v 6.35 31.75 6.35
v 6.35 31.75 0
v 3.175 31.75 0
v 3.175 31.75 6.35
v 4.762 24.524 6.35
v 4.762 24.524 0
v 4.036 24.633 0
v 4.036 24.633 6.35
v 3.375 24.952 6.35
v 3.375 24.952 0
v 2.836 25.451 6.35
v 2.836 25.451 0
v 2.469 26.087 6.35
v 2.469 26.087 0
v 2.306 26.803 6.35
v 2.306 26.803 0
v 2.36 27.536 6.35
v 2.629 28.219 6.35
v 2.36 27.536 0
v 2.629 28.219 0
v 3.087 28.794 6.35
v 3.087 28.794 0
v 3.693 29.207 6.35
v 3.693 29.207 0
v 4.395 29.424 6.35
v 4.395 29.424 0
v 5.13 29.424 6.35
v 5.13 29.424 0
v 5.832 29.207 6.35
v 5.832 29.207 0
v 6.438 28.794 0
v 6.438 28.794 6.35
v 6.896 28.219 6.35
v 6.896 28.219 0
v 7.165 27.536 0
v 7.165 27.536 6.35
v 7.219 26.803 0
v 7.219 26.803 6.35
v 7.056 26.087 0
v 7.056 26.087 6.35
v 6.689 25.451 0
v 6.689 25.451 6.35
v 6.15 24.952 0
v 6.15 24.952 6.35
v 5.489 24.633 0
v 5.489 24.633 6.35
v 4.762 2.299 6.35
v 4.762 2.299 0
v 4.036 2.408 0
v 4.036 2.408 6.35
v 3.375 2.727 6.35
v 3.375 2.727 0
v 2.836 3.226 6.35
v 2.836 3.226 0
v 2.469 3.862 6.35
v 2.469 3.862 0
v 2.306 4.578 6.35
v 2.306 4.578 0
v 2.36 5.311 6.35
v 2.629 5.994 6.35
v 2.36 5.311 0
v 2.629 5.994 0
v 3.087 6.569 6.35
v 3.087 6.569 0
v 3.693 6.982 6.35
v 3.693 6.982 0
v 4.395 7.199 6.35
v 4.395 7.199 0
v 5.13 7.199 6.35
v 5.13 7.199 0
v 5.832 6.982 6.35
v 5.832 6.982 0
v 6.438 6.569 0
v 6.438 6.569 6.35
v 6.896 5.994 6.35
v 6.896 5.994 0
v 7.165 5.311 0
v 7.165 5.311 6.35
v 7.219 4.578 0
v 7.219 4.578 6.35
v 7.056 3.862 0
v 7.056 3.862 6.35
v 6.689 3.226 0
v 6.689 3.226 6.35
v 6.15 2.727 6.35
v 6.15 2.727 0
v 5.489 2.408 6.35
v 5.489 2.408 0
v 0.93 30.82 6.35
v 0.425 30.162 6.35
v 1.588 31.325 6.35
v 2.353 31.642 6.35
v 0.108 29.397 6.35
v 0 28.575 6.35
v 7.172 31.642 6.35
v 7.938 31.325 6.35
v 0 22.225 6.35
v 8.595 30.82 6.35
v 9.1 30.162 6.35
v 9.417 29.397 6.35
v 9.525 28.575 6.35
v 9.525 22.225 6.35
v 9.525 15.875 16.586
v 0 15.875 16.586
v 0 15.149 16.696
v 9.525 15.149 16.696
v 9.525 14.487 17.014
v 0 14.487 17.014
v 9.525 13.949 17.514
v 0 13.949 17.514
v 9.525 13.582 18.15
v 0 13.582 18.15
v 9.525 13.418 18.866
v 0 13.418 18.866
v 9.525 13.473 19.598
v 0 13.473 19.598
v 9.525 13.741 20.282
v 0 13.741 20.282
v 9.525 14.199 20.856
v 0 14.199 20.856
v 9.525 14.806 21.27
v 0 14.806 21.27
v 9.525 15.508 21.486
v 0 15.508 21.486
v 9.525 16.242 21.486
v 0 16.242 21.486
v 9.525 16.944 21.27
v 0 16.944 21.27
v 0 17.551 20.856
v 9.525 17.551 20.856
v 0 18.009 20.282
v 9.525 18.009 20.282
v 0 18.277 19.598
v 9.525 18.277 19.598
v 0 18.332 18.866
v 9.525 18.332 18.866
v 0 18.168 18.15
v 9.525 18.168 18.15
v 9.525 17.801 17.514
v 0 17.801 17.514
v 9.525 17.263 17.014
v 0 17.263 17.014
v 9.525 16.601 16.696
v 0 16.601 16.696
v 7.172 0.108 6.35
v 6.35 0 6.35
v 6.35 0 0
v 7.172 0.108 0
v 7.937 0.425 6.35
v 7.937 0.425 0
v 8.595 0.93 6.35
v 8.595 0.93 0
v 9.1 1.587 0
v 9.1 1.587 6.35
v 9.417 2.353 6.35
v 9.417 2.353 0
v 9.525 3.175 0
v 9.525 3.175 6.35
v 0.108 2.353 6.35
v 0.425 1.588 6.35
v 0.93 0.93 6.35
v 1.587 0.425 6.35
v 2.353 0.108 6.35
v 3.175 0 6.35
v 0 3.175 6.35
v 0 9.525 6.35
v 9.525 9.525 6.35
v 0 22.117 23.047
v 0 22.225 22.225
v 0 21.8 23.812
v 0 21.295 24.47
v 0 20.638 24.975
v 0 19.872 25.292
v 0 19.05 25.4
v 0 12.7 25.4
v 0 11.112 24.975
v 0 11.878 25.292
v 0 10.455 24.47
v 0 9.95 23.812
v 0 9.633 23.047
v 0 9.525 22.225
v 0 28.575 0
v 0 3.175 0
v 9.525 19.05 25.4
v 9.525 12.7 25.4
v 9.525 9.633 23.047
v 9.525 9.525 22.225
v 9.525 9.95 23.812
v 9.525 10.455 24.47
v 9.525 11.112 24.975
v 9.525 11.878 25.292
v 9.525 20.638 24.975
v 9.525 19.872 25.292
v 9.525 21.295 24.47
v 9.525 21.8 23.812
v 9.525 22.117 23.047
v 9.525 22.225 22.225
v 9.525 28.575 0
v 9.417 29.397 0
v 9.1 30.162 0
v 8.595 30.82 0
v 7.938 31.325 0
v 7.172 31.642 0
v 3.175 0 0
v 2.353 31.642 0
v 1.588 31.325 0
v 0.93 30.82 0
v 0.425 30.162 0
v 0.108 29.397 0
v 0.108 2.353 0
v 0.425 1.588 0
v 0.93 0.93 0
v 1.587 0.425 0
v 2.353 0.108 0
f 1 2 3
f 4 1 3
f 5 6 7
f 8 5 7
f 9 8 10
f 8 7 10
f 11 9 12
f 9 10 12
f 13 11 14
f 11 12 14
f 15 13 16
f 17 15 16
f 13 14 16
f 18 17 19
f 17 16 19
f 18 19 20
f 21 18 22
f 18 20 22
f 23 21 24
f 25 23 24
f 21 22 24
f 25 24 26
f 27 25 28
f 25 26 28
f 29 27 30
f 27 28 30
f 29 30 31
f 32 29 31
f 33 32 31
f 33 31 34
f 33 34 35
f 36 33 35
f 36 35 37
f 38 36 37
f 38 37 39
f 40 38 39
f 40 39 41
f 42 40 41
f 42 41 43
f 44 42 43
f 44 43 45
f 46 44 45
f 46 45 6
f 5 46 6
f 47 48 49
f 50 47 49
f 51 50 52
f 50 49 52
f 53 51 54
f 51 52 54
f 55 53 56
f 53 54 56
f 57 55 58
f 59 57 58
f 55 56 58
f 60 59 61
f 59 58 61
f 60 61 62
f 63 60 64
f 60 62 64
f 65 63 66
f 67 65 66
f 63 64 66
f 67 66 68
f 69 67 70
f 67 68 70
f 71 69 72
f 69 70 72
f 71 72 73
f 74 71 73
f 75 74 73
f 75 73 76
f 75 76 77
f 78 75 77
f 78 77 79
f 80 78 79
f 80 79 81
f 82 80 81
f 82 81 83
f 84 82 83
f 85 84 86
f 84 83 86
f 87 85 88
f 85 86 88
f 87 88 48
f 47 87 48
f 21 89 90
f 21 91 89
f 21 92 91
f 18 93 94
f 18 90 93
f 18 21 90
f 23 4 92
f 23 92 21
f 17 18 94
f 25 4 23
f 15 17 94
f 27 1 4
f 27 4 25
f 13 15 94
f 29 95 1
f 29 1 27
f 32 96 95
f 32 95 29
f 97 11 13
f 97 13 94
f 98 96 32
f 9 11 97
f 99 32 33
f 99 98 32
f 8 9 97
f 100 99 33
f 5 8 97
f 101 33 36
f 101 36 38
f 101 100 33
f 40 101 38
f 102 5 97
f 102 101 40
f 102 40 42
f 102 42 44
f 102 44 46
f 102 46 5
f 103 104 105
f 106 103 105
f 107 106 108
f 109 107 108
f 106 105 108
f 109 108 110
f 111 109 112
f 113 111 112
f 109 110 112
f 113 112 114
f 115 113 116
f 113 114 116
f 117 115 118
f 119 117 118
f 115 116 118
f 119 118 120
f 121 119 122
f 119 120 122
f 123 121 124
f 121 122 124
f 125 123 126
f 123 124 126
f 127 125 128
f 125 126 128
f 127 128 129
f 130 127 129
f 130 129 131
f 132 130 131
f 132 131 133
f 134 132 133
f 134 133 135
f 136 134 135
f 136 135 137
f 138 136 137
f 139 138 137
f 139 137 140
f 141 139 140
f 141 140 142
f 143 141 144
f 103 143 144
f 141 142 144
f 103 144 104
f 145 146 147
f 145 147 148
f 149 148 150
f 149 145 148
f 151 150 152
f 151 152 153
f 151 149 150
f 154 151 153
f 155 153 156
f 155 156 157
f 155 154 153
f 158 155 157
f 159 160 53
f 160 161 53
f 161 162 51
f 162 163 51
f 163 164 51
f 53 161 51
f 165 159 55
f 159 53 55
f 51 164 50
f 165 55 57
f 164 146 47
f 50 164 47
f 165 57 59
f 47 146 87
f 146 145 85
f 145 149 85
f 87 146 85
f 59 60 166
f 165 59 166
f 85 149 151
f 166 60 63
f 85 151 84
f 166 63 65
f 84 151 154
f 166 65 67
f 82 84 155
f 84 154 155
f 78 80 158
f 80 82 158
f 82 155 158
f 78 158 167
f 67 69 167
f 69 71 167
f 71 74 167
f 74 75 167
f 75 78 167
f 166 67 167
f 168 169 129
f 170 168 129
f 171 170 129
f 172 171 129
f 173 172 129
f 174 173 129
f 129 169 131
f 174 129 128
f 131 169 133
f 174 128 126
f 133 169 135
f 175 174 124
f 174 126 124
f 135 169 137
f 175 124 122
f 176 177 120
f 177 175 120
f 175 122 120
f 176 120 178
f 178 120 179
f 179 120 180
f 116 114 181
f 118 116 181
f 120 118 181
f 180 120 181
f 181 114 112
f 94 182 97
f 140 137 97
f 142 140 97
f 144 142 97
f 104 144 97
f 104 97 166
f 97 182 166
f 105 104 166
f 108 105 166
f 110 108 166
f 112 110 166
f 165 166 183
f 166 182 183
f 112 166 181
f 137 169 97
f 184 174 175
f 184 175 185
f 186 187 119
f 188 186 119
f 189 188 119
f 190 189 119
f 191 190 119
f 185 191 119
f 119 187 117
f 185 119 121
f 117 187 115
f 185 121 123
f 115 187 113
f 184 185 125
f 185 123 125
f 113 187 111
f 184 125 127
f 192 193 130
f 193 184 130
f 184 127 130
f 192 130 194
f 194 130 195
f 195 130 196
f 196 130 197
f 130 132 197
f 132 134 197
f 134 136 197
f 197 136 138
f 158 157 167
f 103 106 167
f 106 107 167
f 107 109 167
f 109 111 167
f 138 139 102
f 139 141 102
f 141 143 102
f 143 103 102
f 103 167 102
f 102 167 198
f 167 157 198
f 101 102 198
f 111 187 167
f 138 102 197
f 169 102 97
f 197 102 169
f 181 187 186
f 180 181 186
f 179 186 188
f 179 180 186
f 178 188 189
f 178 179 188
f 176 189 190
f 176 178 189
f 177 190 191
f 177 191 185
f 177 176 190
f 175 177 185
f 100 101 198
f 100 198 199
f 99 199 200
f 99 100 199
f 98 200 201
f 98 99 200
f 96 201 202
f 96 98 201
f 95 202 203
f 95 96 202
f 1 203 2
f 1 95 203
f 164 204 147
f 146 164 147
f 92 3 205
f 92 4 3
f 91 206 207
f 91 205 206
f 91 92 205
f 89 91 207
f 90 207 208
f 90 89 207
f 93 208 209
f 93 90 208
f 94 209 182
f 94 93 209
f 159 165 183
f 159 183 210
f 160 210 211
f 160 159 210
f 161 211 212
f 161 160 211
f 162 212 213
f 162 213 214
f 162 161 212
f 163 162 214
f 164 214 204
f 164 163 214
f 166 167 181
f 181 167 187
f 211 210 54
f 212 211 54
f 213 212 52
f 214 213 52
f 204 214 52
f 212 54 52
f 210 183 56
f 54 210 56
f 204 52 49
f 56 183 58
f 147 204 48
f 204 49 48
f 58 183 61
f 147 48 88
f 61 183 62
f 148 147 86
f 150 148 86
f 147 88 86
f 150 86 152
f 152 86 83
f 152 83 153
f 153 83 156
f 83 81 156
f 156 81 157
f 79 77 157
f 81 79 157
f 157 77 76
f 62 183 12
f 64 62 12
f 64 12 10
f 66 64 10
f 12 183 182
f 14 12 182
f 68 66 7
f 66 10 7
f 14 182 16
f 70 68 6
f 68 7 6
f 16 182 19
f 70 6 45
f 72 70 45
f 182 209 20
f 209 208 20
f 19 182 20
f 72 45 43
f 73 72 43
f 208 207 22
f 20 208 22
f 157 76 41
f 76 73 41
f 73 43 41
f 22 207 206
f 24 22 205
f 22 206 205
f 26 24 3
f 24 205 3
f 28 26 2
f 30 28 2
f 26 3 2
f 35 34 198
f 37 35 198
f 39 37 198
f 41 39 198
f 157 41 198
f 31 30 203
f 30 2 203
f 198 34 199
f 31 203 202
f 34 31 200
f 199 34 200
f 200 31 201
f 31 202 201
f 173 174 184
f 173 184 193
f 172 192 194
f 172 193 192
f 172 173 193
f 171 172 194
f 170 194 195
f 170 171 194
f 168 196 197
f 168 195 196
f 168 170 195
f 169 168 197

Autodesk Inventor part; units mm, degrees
ref_plane "YZ Plane" through (0, 0, 0) normal (1, 0, 0) x (0, 1, 0)
ref_plane "XZ Plane" through (0, 0, 0) normal (0, 1, 0) x (-1, 0, 0)
ref_plane "XY Plane" through (0, 0, 0) normal (0, 0, 1) x (1, 0, 0)
sketch "Sketch1" plane through (0, 0, 0) normal (0, 0, 1) x (1, 0, 0)
  line L0 (0, 0) -> (9.525, 0)
  line L1 (9.525, 0) -> (9.525, 31.75)
  line L2 (9.525, 31.75) -> (0, 31.75)
  line L3 (0, 31.75) -> (0, 0)
  dimension "d0" = 9.525
  dimension "d1" = 31.75
extrude "Extrusion1" add sketch "Sketch1" along normal blind 25.4
sketch "Sketch2" plane through (9.525, 0, 0) normal (1, 0, 0) x (0, 0, -1)
  line L0 (-25.4, 0) -> (-25.4, 31.75) projected
  line L1 (-25.4, 31.75) -> (-6.35, 31.75)
  line L2 (-6.35, 31.75) -> (-6.35, 22.225)
  line L3 (-6.35, 22.225) -> (-25.4, 22.225)
  line L4 (-25.4, 22.225) -> (-25.4, 31.75)
  line L5 (0, 0) -> (-25.4, 0) projected
  line L6 (-25.4, 0) -> (-6.35, 0)
  line L7 (-6.35, 0) -> (-6.35, 9.525)
  line L8 (-6.35, 9.525) -> (-25.4, 9.525)
  line L9 (-25.4, 9.525) -> (-25.4, 0)
  dimension "d4" = 9.525
  dimension "d5" = 9.525
  dimension "d6" = 19.05
  dimension "d7" = 19.05
extrude "Extrusion2" cut sketch "Sketch2" against normal blind 25.4
fillet "Fillet1" radius 3.175 4 edges at (9.525, 31.75, 3.175) (0, 31.75, 3.175) (9.525, 0, 3.175) (0, 0, 3.175)
fillet "Fillet2" radius 3.175 2 edges at (4.7625, 9.525, 25.4) (4.7625, 22.225, 25.4)
sketch "Sketch3" plane through (9.525, 3.175, 0) normal (1, 0, 0) x (0, 0, -1)
  line L0 (-22.225, 6.35) -> (-6.35, 6.35) projected
  line L1 (-6.35, 19.05) -> (-22.225, 19.05) projected
  line L2 (0, 0) -> (0, 25.4) projected
  point P0 (0, -3.175)
  point P1 (-19.05, 12.7)
  dimension "d12" = 6.35
  dimension "d13" = 6.35
  dimension "d14" = 19.05
hole "Hole1" at (9.525, 15.875, 19.05) direction (-1, 0, 0) diameter 4.9276 depth 25.4 tip angle 118 clearance for "Flat Head Machine Screw (82)" size "#8" standard "Ansi Unified Screw Threads"
sketch "Sketch4" plane through (0, 22.225, 6.35) normal (0, 0, 1) x (1, 0, 0)
  line L0 (0, 0) -> (0, 6.35) projected
  line L1 (9.525, 6.35) -> (9.525, 0) projected
  line L2 (0, -19.05) -> (0, -12.7) projected
  line L3 (9.525, -12.7) -> (9.525, -19.05) projected
  line L4 (6.35, -22.225) -> (3.175, -22.225) projected
  line L5 (3.175, 9.525) -> (6.35, 9.525) projected
  point P0 (0, -22.225)
  point P1 (4.7625, -17.4625)
  point P2 (4.7625, 4.7625)
  dimension "d22" = 4.7625
  dimension "d23" = 4.7625
  dimension "d24" = 4.7625
  dimension "d25" = 4.7625
  dimension "d26" = 4.7625
  dimension "d27" = 4.7625
  dimension "d28" = 22.225
hole "Hole2" at (4.7625, 4.7625, 6.35) at (4.7625, 26.9875, 6.35) direction (0, 0, -1) diameter 4.9276 depth 25.4 tip angle 118 clearance for "Flat Head Machine Screw (82)" size "#8" standard "Ansi Unified Screw Threads"
equation "\"d5\" = d4"
equation "\"d7\" = d6"
equation "\"d12\" = d13"
equation "\"d22\" = d23"
equation "\"d24\" = d25"
equation "\"d26\" = d27"
properties part number "FTC Piv moount"
